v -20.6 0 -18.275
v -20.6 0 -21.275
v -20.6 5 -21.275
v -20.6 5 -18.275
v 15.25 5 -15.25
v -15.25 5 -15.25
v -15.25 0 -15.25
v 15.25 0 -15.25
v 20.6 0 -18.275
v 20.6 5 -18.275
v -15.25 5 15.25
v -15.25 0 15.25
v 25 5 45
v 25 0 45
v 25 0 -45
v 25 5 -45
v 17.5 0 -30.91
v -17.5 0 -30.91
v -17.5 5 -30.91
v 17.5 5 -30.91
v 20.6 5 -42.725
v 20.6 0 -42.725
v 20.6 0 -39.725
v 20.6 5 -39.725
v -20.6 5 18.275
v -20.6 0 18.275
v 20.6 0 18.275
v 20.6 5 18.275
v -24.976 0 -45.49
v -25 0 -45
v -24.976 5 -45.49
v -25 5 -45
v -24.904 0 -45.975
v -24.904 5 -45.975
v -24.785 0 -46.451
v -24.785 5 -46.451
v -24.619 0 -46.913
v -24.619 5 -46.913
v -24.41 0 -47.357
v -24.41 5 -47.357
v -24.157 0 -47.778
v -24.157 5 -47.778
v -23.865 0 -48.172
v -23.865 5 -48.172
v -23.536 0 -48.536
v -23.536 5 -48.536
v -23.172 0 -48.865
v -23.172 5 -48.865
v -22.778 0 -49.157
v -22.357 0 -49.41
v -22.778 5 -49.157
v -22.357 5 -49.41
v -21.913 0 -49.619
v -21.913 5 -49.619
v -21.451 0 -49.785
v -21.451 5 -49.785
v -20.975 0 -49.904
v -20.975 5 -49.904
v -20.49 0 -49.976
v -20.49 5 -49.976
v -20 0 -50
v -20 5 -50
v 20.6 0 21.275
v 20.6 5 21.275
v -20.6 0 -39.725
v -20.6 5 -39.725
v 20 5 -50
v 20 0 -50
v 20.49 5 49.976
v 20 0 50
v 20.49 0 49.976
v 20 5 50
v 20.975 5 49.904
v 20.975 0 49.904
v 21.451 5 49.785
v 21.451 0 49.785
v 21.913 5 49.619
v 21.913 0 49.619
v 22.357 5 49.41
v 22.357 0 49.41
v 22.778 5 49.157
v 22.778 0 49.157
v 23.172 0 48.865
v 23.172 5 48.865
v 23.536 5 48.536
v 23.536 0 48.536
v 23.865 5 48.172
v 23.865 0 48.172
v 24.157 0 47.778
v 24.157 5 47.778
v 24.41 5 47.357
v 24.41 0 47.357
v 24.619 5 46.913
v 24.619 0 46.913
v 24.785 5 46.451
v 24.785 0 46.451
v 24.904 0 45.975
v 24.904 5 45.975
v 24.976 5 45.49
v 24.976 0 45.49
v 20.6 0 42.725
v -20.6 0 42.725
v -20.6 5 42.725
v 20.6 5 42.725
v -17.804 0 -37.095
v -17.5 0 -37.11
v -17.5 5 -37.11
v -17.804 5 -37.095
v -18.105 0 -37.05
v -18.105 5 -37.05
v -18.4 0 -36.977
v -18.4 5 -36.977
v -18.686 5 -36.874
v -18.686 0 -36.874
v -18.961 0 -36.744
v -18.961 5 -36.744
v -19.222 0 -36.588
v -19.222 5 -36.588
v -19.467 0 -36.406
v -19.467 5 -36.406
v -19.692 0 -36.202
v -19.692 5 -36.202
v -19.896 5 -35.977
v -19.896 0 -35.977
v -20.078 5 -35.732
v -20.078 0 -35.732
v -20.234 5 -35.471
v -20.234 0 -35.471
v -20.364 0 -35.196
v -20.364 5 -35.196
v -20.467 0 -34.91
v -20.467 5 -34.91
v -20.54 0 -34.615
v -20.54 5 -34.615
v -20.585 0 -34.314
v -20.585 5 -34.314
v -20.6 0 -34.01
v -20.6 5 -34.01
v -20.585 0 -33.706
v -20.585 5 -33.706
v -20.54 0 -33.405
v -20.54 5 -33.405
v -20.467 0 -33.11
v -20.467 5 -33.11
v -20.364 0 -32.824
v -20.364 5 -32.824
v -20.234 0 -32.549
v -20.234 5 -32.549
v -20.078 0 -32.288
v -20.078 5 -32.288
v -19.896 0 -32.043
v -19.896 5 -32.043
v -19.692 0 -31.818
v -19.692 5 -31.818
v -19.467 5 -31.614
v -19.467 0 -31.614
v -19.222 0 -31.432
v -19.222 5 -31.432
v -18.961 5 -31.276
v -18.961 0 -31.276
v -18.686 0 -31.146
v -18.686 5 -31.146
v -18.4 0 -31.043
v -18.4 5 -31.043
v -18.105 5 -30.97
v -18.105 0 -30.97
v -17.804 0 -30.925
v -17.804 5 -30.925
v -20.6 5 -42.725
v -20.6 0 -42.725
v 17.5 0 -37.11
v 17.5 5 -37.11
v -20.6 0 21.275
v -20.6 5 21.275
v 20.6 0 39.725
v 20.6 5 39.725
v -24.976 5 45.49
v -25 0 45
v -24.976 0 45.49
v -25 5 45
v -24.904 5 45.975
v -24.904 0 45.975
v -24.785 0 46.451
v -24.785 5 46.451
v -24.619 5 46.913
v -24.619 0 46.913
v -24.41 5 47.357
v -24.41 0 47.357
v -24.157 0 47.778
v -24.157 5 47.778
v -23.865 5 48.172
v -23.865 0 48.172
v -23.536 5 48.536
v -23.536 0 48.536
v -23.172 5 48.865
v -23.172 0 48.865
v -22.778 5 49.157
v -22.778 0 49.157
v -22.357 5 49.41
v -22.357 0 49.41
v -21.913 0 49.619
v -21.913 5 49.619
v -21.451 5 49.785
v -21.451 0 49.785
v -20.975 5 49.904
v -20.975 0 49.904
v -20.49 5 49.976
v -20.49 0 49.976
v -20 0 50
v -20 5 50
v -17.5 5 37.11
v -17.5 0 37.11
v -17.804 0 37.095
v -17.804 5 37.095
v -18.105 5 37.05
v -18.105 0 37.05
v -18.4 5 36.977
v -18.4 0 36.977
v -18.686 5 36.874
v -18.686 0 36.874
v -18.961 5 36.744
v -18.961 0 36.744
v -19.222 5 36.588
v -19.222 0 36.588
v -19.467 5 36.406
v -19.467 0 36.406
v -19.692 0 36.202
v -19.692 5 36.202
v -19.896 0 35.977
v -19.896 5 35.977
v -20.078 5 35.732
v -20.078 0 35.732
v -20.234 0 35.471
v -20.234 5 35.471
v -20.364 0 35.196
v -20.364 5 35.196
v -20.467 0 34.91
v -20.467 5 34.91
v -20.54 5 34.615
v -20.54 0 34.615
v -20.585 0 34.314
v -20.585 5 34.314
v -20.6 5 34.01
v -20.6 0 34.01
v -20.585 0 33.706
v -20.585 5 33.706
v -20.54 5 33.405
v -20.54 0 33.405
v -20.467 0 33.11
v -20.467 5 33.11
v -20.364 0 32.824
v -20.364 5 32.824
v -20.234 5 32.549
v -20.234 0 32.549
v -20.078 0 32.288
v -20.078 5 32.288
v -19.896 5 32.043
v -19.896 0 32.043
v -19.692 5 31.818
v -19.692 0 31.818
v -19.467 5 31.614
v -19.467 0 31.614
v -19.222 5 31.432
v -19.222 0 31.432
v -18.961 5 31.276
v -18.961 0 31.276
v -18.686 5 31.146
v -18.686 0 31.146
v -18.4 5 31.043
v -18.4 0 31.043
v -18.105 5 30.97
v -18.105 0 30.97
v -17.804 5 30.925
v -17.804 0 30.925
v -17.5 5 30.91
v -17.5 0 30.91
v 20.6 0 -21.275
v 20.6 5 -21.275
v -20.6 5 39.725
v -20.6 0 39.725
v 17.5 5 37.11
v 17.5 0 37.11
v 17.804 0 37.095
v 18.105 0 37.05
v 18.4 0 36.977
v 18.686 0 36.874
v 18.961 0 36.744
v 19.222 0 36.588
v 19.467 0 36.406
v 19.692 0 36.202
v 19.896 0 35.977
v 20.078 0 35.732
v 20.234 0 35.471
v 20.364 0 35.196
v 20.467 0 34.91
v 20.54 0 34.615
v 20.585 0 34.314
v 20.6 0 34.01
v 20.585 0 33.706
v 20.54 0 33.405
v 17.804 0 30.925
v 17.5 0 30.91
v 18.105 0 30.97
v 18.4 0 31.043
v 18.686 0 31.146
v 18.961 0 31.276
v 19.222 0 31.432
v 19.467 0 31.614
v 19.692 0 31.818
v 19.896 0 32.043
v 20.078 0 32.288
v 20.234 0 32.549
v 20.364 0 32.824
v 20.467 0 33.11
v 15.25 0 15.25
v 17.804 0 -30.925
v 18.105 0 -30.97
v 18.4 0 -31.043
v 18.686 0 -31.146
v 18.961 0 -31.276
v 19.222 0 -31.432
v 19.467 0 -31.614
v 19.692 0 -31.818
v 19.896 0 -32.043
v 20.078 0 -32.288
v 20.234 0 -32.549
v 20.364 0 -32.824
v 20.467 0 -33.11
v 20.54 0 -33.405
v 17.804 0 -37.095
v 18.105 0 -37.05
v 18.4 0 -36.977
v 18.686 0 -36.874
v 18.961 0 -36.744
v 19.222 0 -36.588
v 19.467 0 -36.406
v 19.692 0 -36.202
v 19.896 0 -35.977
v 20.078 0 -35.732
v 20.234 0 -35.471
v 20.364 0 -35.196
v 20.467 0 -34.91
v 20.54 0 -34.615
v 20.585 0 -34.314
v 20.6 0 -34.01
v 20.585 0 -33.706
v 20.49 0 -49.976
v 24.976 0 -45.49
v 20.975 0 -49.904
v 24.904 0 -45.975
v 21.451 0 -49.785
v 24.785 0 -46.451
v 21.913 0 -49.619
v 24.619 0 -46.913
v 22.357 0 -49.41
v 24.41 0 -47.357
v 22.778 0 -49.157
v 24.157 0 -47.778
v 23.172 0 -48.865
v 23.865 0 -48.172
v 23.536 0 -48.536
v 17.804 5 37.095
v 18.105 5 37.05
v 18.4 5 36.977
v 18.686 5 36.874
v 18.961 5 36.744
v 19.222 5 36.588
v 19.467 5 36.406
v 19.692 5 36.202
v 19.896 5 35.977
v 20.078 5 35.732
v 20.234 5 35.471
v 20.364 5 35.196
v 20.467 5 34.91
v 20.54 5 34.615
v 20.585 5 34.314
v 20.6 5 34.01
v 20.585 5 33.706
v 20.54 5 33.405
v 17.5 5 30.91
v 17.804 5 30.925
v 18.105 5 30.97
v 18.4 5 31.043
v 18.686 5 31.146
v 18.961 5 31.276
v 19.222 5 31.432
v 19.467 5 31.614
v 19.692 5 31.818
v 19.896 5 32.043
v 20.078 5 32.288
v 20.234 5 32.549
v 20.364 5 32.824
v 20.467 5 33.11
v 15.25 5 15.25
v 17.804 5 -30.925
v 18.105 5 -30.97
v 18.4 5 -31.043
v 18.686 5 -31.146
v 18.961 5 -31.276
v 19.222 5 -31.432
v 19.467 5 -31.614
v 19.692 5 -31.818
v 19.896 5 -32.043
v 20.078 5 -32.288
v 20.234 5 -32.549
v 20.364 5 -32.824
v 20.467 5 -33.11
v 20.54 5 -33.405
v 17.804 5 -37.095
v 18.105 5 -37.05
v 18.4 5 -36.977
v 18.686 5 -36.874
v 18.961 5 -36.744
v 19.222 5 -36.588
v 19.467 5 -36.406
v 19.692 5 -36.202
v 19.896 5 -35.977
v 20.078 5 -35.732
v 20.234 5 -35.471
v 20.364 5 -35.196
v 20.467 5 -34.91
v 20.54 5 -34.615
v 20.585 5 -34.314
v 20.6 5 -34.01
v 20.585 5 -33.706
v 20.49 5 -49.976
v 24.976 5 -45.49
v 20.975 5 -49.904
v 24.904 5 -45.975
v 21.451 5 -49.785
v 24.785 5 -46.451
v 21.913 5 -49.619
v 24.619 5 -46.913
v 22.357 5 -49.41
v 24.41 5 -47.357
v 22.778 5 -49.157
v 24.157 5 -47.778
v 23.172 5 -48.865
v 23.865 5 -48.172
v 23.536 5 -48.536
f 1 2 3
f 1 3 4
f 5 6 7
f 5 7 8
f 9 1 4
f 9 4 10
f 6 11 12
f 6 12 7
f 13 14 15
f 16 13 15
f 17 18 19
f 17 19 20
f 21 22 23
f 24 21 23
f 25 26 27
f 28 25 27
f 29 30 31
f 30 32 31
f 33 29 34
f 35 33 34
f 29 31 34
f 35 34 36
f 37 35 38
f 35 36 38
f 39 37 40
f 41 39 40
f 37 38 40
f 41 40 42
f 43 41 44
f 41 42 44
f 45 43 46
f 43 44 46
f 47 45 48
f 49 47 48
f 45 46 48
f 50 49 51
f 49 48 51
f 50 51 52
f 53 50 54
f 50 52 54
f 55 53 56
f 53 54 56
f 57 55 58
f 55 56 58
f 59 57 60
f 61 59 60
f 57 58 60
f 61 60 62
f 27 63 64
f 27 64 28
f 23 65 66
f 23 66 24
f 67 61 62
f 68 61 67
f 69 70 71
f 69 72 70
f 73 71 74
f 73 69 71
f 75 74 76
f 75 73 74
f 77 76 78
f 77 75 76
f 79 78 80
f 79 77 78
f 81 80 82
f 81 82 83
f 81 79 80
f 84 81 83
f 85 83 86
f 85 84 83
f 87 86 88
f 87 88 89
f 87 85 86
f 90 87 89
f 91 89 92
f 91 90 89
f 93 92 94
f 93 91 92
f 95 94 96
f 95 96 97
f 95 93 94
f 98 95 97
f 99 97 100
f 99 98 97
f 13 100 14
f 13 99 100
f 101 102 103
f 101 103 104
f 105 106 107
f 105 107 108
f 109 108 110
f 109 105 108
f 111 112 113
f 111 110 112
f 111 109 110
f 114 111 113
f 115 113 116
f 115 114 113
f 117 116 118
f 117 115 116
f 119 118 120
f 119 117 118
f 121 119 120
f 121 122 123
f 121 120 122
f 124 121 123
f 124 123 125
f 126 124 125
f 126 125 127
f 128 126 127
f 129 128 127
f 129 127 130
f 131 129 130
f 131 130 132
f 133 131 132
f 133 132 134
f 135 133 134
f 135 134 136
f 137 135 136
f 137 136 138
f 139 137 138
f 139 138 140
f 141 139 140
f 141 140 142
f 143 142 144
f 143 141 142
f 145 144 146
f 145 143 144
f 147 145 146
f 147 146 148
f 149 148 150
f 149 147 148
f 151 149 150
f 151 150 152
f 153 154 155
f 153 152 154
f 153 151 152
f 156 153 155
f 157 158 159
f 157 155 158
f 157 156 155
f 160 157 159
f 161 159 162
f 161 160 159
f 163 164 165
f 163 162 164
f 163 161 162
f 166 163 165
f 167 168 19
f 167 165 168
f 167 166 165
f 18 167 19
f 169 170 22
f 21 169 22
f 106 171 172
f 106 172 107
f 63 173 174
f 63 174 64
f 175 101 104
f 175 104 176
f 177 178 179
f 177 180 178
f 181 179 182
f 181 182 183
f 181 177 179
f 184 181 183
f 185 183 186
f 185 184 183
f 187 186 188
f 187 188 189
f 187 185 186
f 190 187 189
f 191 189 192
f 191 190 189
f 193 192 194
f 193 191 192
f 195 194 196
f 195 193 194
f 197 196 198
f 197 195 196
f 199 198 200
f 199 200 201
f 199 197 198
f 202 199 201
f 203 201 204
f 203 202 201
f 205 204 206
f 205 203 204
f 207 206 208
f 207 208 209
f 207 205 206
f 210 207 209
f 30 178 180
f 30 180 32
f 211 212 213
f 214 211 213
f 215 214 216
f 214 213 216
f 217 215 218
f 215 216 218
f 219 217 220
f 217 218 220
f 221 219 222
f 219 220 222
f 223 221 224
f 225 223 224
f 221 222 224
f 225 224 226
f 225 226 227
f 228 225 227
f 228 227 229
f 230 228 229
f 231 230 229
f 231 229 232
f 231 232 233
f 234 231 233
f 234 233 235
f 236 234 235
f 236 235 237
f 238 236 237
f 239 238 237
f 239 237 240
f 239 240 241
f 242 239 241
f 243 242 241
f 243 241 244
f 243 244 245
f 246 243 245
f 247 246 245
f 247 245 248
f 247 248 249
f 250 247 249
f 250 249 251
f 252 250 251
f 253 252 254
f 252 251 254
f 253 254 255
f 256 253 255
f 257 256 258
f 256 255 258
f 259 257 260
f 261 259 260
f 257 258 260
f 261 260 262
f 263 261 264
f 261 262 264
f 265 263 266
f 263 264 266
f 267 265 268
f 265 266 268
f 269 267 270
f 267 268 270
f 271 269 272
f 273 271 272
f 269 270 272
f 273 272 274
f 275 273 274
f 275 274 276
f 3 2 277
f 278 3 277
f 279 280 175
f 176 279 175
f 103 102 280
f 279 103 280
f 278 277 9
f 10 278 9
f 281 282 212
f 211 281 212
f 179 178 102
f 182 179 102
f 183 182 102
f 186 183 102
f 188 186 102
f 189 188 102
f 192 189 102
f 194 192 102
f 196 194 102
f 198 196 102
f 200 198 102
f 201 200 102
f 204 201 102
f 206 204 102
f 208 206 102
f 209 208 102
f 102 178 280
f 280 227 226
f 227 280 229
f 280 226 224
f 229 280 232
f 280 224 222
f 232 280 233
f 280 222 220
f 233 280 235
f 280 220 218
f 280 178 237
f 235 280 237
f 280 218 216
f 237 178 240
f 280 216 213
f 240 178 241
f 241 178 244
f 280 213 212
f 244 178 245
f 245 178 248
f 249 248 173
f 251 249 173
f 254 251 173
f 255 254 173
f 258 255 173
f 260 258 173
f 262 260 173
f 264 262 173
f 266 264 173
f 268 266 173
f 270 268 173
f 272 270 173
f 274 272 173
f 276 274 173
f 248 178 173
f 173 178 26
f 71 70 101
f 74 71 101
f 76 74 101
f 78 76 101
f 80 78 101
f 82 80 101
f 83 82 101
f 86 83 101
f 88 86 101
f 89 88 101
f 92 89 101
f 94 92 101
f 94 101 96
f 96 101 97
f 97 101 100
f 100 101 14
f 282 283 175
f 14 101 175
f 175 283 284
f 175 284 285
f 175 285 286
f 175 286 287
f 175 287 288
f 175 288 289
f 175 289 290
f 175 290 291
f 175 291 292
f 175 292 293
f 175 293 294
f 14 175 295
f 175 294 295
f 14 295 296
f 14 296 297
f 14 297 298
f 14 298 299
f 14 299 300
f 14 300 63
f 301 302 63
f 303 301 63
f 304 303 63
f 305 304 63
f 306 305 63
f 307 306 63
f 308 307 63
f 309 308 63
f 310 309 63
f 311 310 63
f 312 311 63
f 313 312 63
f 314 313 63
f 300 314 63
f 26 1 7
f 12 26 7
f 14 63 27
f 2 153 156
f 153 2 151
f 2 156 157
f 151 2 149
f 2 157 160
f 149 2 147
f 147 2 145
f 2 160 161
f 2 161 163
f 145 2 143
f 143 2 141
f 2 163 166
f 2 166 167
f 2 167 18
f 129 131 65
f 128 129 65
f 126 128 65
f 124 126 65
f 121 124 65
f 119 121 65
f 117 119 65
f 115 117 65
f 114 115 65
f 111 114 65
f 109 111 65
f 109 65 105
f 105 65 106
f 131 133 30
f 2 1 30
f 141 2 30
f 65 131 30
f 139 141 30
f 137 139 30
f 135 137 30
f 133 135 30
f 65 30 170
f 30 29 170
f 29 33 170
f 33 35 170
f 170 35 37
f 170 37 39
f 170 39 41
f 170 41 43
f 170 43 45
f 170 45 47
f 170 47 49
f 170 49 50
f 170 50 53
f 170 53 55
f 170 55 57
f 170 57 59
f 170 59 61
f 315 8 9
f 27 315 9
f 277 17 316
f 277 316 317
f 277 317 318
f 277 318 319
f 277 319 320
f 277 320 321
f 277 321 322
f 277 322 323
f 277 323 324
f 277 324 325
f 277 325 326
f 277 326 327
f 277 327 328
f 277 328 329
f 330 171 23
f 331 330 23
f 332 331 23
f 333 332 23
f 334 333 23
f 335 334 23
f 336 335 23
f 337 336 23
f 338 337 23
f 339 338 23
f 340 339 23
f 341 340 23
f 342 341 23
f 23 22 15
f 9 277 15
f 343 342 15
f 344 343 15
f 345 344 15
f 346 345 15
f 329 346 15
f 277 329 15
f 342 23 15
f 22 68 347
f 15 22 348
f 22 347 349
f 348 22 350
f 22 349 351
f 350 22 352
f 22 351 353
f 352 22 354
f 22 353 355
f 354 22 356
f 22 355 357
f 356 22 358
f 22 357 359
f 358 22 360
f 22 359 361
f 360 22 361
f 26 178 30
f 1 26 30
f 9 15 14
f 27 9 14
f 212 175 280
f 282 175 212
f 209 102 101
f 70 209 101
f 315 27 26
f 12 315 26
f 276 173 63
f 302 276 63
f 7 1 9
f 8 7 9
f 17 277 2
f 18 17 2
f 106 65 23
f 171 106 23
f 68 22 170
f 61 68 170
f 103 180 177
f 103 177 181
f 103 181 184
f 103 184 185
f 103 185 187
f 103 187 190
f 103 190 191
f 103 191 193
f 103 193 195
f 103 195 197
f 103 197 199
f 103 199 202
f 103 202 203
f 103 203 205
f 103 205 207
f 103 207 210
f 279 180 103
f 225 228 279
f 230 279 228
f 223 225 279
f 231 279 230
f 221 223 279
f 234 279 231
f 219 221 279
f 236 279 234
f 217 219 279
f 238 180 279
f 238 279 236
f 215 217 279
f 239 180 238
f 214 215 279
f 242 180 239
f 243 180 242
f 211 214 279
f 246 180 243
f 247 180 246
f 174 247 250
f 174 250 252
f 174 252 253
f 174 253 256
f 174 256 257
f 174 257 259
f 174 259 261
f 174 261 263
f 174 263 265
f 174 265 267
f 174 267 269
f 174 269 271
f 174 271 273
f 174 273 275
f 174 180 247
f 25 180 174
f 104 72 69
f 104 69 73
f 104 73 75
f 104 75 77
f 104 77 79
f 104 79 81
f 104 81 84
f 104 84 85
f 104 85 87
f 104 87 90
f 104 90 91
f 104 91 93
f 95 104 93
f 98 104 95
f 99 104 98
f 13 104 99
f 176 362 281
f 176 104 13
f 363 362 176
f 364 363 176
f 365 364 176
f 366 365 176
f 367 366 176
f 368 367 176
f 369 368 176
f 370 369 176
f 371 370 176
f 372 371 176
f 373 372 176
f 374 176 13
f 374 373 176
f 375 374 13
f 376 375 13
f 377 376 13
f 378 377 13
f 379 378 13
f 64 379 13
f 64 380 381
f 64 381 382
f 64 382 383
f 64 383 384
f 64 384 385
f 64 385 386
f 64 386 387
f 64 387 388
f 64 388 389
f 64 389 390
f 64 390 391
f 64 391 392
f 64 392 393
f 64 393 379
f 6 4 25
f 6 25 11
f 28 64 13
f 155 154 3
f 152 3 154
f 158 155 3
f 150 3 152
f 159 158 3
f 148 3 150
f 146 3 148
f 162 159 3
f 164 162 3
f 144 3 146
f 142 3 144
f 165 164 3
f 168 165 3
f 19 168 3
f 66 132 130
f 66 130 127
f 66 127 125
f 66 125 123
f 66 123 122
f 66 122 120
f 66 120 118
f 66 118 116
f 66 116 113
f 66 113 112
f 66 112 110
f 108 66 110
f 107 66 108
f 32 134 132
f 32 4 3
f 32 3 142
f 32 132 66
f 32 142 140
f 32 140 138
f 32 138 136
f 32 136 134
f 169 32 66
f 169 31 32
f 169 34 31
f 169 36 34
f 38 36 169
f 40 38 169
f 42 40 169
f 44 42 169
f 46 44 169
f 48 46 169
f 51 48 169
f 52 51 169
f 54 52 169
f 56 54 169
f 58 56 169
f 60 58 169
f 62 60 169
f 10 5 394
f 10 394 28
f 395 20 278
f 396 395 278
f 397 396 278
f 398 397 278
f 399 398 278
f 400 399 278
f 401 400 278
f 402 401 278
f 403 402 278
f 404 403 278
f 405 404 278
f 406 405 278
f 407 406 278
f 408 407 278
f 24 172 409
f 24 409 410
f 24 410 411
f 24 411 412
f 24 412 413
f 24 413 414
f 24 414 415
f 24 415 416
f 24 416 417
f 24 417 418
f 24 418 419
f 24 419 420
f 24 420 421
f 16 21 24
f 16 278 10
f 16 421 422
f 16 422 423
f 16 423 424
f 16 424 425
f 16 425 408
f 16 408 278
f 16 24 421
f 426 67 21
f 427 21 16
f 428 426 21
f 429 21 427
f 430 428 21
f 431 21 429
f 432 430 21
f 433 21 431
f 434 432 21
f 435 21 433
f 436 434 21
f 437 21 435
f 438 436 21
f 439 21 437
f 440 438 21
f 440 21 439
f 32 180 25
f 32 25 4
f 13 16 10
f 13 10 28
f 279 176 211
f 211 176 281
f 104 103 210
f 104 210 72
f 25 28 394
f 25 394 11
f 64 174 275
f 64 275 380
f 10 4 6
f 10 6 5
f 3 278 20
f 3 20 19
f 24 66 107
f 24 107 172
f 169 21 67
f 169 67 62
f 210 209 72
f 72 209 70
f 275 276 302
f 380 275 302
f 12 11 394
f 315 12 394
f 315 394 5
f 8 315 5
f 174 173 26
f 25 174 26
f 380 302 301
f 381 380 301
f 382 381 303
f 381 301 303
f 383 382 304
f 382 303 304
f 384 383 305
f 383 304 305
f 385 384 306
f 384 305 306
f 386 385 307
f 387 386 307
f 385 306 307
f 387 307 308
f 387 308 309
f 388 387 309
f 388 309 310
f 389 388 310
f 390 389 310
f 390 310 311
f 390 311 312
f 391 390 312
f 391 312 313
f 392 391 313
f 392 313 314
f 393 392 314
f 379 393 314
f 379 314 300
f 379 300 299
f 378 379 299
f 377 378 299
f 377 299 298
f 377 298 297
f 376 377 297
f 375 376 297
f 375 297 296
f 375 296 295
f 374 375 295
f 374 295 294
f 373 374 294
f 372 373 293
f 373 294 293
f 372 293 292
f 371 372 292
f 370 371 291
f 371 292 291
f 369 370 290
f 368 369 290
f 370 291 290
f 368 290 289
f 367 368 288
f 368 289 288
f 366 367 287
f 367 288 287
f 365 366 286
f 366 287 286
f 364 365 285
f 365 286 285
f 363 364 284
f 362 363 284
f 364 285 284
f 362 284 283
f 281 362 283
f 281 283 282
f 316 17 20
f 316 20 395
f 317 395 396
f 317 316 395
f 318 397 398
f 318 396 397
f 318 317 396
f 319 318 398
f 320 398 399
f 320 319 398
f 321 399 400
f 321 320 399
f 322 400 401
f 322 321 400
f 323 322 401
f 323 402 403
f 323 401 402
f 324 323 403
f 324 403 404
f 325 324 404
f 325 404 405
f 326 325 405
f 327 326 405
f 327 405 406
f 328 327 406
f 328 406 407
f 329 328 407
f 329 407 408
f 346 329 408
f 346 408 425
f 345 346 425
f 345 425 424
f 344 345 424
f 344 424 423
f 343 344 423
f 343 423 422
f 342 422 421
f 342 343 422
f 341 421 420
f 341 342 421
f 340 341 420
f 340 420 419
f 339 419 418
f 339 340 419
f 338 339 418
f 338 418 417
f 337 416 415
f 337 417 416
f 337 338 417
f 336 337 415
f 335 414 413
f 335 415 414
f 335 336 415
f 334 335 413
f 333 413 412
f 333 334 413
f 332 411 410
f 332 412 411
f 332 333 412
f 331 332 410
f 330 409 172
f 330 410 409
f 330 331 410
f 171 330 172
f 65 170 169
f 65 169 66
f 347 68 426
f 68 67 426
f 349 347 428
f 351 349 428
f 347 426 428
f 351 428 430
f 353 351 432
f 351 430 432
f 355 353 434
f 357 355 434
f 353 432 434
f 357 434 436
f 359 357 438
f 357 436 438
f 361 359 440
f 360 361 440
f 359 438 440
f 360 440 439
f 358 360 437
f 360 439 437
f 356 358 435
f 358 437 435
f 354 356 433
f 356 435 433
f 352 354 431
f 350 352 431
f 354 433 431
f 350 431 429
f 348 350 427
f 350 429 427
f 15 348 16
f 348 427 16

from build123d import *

# Parameters (mm, degrees)
SKETCH1_W           = 50
SKETCH1_H           = 100
BOSS_EXTRUDE1_DEPTH = 5
CUT_EXTRUDE1_START  = -6
CUT_EXTRUDE1_DEPTH  = 7
FILLET1_R           = 5
SKETCH3_W           = 30.5
SKETCH3_H           = 30.5
CUT_EXTRUDE2_DEPTH  = 6
CUT_EXTRUDE3_START  = -6
SKETCH4_W           = 41.2
SKETCH4_H           = 3
CUT_EXTRUDE3_DEPTH  = 7


with BuildPart() as part:
    # Sketch1 → Boss-Extrude1 (new body)
    with BuildSketch(Plane(origin=(0, 0, 0), x_dir=(1, 0, 0), z_dir=(0, 1, 0))):
        Rectangle(SKETCH1_W, SKETCH1_H)
    extrude(amount=BOSS_EXTRUDE1_DEPTH)

    # Sketch2 → Cut-Extrude1 (cut)
    with BuildSketch(Plane(origin=(0, 5, 0), x_dir=(1, 0, 0), z_dir=(0, 1, 0)).offset(CUT_EXTRUDE1_START)):
        with BuildLine():
            Line((-17.5, -30.91), (17.5, -30.91))
            ThreePointArc((17.5, -30.91), (20.6, -34.01), (17.5, -37.11))
            Line((17.5, -37.11), (-17.5, -37.11))
            ThreePointArc((-17.5, -37.11), (-20.6, -34.01), (-17.5, -30.91))
        make_face()
    cut_extrude1 = extrude(amount=CUT_EXTRUDE1_DEPTH, mode=Mode.SUBTRACT)

    # Mirror1: Cut-Extrude1 across plane
    add(cut_extrude1.mirror(Plane.XY), mode=Mode.SUBTRACT)

    # Fillet1
    fillet1_edges = [part.edges().sort_by_distance(p)[0] for p in [
        (25, 2.5, 50),
        (-25, 2.5, 50),
        (-25, 2.5, -50),
        (25, 2.5, -50),
    ]]
    fillet(fillet1_edges, radius=FILLET1_R)

    # Sketch3 → Cut-Extrude2 (cut, through all)
    with BuildSketch(Plane(origin=(0, 5, 0), x_dir=(1, 0, 0), z_dir=(0, 1, 0))):
        Rectangle(SKETCH3_W, SKETCH3_H)
    extrude(amount=-CUT_EXTRUDE2_DEPTH, mode=Mode.SUBTRACT)

    # Sketch4 → Cut-Extrude3 (cut)
    with BuildSketch(Plane(origin=(0, 5, 0), x_dir=(1, 0, 0), z_dir=(0, 1, 0)).offset(CUT_EXTRUDE3_START)):
        with Locations((0, -19.775)):
            Rectangle(SKETCH4_W, SKETCH4_H)
        with Locations((0, -41.225)):
            Rectangle(SKETCH4_W, SKETCH4_H)
    cut_extrude3 = extrude(amount=CUT_EXTRUDE3_DEPTH, mode=Mode.SUBTRACT)

    # Mirror2: Cut-Extrude3 across plane
    add(cut_extrude3.mirror(Plane.XY), mode=Mode.SUBTRACT)


solid = part.part
